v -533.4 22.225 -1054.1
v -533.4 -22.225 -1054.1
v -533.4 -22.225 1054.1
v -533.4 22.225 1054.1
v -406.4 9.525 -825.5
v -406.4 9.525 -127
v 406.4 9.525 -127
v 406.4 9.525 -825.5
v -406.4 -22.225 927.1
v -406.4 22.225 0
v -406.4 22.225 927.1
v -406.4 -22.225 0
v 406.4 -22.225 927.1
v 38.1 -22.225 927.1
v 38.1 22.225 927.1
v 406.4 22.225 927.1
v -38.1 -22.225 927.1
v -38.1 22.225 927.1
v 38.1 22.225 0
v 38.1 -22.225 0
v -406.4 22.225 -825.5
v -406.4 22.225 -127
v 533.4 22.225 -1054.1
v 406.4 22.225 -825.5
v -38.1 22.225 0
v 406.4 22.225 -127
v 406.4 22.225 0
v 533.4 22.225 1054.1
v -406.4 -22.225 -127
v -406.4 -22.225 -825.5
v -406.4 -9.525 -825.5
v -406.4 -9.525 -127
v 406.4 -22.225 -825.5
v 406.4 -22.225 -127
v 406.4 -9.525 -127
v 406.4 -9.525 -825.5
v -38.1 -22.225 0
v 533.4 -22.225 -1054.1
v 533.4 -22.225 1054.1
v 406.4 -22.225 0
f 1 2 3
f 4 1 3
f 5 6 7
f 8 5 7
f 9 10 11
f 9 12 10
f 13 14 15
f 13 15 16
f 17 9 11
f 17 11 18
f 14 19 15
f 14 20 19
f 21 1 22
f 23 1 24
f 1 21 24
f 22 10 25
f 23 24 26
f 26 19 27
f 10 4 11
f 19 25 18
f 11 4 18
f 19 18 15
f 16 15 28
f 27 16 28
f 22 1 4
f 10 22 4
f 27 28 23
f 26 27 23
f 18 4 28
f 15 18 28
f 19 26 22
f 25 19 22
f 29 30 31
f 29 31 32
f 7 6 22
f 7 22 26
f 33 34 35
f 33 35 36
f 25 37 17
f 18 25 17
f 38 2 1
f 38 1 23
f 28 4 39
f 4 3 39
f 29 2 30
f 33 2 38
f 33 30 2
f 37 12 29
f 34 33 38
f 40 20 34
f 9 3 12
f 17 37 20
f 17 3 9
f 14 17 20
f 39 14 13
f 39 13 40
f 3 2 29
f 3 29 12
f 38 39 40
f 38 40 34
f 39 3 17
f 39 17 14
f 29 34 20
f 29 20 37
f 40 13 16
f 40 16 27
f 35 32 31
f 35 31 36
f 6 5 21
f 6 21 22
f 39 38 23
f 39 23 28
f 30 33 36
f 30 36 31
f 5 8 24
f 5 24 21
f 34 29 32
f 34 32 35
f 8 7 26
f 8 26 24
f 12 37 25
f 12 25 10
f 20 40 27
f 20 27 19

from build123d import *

# Parameters (mm, degrees)
F0_W     = 1066.8
F0_H     = 2108.2
F0_W_2   = 76.2
F0_H_2   = 927.1
F1_DEPTH = 22.225
F0_W_3   = 812.8
F0_H_3   = 698.5
F2_DEPTH = 9.525


with BuildPart() as f1:
    # F0 (on Front) → F1 (new body, symmetric)
    with BuildSketch(Plane.XZ):
        Rectangle(F0_W, F0_H)
        Polygon((-406.4, 0), (-406.4, 927.1), (-38.1, 927.1), (38.1, 927.1), (406.4, 927.1), (406.4, 0), (406.4, -127), (406.4, -825.5), (-406.4, -825.5), (-406.4, -127), align=None, mode=Mode.SUBTRACT)
        with Locations((0, 463.55)):
            Rectangle(F0_W_2, F0_H_2)
        Polygon((-38.1, 0), (-406.4, 0), (-406.4, -127), (406.4, -127), (406.4, 0), (38.1, 0), align=None)
    extrude(amount=F1_DEPTH, both=True)

    # F0 (on Front) → F2 (join, symmetric)
    with BuildSketch(Plane.XZ):
        with Locations((0, -476.25)):
            Rectangle(F0_W_3, F0_H_3)
    extrude(amount=F2_DEPTH, both=True)


solid = f1.part
